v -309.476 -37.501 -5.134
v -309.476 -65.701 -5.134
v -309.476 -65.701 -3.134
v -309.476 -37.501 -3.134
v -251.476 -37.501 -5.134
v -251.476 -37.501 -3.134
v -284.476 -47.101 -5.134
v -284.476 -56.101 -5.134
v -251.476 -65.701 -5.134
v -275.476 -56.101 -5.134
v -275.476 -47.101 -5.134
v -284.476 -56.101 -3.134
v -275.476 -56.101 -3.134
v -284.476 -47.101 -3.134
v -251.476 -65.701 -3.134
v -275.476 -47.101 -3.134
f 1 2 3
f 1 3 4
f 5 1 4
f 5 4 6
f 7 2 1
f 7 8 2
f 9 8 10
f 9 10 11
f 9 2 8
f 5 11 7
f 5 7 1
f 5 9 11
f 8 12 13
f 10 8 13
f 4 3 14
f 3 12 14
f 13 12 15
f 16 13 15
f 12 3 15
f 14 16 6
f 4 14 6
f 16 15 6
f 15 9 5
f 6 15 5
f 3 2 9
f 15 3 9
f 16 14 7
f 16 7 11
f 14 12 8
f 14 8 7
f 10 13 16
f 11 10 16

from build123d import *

# Parameters (mm, degrees)
RECTANGLE003_W     = 9
RECTANGLE003_H     = 9
EXTRUSION005_DEPTH = 2
CIRCLE_R           = 4.26
EXTRUSION001_DEPTH = 34.920666
RECTANGLE_W        = 28.2
RECTANGLE_H        = 58
EXTRUSION_DEPTH    = 2


with BuildPart() as extrusion005:
    # Rectangle003 (on Cut) → Extrusion005 (new body)
    with BuildSketch(Plane(origin=(-284.476256, -56.100832, -3.133948), x_dir=(1, 0, 0), z_dir=(0, 0, 1))):
        with Locations((4.5, 4.5)):
            Rectangle(RECTANGLE003_W, RECTANGLE003_H)
    extrude(amount=-EXTRUSION005_DEPTH)


with BuildPart() as extrusion001:
    # Circle → Extrusion001 (new body)
    with BuildSketch(Plane(origin=(-279.976256, -51.600832, -5.133948), x_dir=(0, 1, 0), z_dir=(0, 0, -1))):
        Circle(CIRCLE_R)
    extrude(amount=-EXTRUSION001_DEPTH)


with BuildPart() as cut002:
    # Rectangle → Extrusion (new body)
    with BuildSketch(Plane(origin=(-309.476256, -65.700832, -5.133948), x_dir=(0, 1, 0), z_dir=(0, 0, -1))):
        with Locations((14.1, 29)):
            Rectangle(RECTANGLE_W, RECTANGLE_H)
    extrude(amount=-EXTRUSION_DEPTH)

    # Cut: cut Extrusion001
    add(extrusion001.part, mode=Mode.SUBTRACT)

    # Cut002: cut Extrusion005
    add(extrusion005.part, mode=Mode.SUBTRACT)


solid = cut002.part
